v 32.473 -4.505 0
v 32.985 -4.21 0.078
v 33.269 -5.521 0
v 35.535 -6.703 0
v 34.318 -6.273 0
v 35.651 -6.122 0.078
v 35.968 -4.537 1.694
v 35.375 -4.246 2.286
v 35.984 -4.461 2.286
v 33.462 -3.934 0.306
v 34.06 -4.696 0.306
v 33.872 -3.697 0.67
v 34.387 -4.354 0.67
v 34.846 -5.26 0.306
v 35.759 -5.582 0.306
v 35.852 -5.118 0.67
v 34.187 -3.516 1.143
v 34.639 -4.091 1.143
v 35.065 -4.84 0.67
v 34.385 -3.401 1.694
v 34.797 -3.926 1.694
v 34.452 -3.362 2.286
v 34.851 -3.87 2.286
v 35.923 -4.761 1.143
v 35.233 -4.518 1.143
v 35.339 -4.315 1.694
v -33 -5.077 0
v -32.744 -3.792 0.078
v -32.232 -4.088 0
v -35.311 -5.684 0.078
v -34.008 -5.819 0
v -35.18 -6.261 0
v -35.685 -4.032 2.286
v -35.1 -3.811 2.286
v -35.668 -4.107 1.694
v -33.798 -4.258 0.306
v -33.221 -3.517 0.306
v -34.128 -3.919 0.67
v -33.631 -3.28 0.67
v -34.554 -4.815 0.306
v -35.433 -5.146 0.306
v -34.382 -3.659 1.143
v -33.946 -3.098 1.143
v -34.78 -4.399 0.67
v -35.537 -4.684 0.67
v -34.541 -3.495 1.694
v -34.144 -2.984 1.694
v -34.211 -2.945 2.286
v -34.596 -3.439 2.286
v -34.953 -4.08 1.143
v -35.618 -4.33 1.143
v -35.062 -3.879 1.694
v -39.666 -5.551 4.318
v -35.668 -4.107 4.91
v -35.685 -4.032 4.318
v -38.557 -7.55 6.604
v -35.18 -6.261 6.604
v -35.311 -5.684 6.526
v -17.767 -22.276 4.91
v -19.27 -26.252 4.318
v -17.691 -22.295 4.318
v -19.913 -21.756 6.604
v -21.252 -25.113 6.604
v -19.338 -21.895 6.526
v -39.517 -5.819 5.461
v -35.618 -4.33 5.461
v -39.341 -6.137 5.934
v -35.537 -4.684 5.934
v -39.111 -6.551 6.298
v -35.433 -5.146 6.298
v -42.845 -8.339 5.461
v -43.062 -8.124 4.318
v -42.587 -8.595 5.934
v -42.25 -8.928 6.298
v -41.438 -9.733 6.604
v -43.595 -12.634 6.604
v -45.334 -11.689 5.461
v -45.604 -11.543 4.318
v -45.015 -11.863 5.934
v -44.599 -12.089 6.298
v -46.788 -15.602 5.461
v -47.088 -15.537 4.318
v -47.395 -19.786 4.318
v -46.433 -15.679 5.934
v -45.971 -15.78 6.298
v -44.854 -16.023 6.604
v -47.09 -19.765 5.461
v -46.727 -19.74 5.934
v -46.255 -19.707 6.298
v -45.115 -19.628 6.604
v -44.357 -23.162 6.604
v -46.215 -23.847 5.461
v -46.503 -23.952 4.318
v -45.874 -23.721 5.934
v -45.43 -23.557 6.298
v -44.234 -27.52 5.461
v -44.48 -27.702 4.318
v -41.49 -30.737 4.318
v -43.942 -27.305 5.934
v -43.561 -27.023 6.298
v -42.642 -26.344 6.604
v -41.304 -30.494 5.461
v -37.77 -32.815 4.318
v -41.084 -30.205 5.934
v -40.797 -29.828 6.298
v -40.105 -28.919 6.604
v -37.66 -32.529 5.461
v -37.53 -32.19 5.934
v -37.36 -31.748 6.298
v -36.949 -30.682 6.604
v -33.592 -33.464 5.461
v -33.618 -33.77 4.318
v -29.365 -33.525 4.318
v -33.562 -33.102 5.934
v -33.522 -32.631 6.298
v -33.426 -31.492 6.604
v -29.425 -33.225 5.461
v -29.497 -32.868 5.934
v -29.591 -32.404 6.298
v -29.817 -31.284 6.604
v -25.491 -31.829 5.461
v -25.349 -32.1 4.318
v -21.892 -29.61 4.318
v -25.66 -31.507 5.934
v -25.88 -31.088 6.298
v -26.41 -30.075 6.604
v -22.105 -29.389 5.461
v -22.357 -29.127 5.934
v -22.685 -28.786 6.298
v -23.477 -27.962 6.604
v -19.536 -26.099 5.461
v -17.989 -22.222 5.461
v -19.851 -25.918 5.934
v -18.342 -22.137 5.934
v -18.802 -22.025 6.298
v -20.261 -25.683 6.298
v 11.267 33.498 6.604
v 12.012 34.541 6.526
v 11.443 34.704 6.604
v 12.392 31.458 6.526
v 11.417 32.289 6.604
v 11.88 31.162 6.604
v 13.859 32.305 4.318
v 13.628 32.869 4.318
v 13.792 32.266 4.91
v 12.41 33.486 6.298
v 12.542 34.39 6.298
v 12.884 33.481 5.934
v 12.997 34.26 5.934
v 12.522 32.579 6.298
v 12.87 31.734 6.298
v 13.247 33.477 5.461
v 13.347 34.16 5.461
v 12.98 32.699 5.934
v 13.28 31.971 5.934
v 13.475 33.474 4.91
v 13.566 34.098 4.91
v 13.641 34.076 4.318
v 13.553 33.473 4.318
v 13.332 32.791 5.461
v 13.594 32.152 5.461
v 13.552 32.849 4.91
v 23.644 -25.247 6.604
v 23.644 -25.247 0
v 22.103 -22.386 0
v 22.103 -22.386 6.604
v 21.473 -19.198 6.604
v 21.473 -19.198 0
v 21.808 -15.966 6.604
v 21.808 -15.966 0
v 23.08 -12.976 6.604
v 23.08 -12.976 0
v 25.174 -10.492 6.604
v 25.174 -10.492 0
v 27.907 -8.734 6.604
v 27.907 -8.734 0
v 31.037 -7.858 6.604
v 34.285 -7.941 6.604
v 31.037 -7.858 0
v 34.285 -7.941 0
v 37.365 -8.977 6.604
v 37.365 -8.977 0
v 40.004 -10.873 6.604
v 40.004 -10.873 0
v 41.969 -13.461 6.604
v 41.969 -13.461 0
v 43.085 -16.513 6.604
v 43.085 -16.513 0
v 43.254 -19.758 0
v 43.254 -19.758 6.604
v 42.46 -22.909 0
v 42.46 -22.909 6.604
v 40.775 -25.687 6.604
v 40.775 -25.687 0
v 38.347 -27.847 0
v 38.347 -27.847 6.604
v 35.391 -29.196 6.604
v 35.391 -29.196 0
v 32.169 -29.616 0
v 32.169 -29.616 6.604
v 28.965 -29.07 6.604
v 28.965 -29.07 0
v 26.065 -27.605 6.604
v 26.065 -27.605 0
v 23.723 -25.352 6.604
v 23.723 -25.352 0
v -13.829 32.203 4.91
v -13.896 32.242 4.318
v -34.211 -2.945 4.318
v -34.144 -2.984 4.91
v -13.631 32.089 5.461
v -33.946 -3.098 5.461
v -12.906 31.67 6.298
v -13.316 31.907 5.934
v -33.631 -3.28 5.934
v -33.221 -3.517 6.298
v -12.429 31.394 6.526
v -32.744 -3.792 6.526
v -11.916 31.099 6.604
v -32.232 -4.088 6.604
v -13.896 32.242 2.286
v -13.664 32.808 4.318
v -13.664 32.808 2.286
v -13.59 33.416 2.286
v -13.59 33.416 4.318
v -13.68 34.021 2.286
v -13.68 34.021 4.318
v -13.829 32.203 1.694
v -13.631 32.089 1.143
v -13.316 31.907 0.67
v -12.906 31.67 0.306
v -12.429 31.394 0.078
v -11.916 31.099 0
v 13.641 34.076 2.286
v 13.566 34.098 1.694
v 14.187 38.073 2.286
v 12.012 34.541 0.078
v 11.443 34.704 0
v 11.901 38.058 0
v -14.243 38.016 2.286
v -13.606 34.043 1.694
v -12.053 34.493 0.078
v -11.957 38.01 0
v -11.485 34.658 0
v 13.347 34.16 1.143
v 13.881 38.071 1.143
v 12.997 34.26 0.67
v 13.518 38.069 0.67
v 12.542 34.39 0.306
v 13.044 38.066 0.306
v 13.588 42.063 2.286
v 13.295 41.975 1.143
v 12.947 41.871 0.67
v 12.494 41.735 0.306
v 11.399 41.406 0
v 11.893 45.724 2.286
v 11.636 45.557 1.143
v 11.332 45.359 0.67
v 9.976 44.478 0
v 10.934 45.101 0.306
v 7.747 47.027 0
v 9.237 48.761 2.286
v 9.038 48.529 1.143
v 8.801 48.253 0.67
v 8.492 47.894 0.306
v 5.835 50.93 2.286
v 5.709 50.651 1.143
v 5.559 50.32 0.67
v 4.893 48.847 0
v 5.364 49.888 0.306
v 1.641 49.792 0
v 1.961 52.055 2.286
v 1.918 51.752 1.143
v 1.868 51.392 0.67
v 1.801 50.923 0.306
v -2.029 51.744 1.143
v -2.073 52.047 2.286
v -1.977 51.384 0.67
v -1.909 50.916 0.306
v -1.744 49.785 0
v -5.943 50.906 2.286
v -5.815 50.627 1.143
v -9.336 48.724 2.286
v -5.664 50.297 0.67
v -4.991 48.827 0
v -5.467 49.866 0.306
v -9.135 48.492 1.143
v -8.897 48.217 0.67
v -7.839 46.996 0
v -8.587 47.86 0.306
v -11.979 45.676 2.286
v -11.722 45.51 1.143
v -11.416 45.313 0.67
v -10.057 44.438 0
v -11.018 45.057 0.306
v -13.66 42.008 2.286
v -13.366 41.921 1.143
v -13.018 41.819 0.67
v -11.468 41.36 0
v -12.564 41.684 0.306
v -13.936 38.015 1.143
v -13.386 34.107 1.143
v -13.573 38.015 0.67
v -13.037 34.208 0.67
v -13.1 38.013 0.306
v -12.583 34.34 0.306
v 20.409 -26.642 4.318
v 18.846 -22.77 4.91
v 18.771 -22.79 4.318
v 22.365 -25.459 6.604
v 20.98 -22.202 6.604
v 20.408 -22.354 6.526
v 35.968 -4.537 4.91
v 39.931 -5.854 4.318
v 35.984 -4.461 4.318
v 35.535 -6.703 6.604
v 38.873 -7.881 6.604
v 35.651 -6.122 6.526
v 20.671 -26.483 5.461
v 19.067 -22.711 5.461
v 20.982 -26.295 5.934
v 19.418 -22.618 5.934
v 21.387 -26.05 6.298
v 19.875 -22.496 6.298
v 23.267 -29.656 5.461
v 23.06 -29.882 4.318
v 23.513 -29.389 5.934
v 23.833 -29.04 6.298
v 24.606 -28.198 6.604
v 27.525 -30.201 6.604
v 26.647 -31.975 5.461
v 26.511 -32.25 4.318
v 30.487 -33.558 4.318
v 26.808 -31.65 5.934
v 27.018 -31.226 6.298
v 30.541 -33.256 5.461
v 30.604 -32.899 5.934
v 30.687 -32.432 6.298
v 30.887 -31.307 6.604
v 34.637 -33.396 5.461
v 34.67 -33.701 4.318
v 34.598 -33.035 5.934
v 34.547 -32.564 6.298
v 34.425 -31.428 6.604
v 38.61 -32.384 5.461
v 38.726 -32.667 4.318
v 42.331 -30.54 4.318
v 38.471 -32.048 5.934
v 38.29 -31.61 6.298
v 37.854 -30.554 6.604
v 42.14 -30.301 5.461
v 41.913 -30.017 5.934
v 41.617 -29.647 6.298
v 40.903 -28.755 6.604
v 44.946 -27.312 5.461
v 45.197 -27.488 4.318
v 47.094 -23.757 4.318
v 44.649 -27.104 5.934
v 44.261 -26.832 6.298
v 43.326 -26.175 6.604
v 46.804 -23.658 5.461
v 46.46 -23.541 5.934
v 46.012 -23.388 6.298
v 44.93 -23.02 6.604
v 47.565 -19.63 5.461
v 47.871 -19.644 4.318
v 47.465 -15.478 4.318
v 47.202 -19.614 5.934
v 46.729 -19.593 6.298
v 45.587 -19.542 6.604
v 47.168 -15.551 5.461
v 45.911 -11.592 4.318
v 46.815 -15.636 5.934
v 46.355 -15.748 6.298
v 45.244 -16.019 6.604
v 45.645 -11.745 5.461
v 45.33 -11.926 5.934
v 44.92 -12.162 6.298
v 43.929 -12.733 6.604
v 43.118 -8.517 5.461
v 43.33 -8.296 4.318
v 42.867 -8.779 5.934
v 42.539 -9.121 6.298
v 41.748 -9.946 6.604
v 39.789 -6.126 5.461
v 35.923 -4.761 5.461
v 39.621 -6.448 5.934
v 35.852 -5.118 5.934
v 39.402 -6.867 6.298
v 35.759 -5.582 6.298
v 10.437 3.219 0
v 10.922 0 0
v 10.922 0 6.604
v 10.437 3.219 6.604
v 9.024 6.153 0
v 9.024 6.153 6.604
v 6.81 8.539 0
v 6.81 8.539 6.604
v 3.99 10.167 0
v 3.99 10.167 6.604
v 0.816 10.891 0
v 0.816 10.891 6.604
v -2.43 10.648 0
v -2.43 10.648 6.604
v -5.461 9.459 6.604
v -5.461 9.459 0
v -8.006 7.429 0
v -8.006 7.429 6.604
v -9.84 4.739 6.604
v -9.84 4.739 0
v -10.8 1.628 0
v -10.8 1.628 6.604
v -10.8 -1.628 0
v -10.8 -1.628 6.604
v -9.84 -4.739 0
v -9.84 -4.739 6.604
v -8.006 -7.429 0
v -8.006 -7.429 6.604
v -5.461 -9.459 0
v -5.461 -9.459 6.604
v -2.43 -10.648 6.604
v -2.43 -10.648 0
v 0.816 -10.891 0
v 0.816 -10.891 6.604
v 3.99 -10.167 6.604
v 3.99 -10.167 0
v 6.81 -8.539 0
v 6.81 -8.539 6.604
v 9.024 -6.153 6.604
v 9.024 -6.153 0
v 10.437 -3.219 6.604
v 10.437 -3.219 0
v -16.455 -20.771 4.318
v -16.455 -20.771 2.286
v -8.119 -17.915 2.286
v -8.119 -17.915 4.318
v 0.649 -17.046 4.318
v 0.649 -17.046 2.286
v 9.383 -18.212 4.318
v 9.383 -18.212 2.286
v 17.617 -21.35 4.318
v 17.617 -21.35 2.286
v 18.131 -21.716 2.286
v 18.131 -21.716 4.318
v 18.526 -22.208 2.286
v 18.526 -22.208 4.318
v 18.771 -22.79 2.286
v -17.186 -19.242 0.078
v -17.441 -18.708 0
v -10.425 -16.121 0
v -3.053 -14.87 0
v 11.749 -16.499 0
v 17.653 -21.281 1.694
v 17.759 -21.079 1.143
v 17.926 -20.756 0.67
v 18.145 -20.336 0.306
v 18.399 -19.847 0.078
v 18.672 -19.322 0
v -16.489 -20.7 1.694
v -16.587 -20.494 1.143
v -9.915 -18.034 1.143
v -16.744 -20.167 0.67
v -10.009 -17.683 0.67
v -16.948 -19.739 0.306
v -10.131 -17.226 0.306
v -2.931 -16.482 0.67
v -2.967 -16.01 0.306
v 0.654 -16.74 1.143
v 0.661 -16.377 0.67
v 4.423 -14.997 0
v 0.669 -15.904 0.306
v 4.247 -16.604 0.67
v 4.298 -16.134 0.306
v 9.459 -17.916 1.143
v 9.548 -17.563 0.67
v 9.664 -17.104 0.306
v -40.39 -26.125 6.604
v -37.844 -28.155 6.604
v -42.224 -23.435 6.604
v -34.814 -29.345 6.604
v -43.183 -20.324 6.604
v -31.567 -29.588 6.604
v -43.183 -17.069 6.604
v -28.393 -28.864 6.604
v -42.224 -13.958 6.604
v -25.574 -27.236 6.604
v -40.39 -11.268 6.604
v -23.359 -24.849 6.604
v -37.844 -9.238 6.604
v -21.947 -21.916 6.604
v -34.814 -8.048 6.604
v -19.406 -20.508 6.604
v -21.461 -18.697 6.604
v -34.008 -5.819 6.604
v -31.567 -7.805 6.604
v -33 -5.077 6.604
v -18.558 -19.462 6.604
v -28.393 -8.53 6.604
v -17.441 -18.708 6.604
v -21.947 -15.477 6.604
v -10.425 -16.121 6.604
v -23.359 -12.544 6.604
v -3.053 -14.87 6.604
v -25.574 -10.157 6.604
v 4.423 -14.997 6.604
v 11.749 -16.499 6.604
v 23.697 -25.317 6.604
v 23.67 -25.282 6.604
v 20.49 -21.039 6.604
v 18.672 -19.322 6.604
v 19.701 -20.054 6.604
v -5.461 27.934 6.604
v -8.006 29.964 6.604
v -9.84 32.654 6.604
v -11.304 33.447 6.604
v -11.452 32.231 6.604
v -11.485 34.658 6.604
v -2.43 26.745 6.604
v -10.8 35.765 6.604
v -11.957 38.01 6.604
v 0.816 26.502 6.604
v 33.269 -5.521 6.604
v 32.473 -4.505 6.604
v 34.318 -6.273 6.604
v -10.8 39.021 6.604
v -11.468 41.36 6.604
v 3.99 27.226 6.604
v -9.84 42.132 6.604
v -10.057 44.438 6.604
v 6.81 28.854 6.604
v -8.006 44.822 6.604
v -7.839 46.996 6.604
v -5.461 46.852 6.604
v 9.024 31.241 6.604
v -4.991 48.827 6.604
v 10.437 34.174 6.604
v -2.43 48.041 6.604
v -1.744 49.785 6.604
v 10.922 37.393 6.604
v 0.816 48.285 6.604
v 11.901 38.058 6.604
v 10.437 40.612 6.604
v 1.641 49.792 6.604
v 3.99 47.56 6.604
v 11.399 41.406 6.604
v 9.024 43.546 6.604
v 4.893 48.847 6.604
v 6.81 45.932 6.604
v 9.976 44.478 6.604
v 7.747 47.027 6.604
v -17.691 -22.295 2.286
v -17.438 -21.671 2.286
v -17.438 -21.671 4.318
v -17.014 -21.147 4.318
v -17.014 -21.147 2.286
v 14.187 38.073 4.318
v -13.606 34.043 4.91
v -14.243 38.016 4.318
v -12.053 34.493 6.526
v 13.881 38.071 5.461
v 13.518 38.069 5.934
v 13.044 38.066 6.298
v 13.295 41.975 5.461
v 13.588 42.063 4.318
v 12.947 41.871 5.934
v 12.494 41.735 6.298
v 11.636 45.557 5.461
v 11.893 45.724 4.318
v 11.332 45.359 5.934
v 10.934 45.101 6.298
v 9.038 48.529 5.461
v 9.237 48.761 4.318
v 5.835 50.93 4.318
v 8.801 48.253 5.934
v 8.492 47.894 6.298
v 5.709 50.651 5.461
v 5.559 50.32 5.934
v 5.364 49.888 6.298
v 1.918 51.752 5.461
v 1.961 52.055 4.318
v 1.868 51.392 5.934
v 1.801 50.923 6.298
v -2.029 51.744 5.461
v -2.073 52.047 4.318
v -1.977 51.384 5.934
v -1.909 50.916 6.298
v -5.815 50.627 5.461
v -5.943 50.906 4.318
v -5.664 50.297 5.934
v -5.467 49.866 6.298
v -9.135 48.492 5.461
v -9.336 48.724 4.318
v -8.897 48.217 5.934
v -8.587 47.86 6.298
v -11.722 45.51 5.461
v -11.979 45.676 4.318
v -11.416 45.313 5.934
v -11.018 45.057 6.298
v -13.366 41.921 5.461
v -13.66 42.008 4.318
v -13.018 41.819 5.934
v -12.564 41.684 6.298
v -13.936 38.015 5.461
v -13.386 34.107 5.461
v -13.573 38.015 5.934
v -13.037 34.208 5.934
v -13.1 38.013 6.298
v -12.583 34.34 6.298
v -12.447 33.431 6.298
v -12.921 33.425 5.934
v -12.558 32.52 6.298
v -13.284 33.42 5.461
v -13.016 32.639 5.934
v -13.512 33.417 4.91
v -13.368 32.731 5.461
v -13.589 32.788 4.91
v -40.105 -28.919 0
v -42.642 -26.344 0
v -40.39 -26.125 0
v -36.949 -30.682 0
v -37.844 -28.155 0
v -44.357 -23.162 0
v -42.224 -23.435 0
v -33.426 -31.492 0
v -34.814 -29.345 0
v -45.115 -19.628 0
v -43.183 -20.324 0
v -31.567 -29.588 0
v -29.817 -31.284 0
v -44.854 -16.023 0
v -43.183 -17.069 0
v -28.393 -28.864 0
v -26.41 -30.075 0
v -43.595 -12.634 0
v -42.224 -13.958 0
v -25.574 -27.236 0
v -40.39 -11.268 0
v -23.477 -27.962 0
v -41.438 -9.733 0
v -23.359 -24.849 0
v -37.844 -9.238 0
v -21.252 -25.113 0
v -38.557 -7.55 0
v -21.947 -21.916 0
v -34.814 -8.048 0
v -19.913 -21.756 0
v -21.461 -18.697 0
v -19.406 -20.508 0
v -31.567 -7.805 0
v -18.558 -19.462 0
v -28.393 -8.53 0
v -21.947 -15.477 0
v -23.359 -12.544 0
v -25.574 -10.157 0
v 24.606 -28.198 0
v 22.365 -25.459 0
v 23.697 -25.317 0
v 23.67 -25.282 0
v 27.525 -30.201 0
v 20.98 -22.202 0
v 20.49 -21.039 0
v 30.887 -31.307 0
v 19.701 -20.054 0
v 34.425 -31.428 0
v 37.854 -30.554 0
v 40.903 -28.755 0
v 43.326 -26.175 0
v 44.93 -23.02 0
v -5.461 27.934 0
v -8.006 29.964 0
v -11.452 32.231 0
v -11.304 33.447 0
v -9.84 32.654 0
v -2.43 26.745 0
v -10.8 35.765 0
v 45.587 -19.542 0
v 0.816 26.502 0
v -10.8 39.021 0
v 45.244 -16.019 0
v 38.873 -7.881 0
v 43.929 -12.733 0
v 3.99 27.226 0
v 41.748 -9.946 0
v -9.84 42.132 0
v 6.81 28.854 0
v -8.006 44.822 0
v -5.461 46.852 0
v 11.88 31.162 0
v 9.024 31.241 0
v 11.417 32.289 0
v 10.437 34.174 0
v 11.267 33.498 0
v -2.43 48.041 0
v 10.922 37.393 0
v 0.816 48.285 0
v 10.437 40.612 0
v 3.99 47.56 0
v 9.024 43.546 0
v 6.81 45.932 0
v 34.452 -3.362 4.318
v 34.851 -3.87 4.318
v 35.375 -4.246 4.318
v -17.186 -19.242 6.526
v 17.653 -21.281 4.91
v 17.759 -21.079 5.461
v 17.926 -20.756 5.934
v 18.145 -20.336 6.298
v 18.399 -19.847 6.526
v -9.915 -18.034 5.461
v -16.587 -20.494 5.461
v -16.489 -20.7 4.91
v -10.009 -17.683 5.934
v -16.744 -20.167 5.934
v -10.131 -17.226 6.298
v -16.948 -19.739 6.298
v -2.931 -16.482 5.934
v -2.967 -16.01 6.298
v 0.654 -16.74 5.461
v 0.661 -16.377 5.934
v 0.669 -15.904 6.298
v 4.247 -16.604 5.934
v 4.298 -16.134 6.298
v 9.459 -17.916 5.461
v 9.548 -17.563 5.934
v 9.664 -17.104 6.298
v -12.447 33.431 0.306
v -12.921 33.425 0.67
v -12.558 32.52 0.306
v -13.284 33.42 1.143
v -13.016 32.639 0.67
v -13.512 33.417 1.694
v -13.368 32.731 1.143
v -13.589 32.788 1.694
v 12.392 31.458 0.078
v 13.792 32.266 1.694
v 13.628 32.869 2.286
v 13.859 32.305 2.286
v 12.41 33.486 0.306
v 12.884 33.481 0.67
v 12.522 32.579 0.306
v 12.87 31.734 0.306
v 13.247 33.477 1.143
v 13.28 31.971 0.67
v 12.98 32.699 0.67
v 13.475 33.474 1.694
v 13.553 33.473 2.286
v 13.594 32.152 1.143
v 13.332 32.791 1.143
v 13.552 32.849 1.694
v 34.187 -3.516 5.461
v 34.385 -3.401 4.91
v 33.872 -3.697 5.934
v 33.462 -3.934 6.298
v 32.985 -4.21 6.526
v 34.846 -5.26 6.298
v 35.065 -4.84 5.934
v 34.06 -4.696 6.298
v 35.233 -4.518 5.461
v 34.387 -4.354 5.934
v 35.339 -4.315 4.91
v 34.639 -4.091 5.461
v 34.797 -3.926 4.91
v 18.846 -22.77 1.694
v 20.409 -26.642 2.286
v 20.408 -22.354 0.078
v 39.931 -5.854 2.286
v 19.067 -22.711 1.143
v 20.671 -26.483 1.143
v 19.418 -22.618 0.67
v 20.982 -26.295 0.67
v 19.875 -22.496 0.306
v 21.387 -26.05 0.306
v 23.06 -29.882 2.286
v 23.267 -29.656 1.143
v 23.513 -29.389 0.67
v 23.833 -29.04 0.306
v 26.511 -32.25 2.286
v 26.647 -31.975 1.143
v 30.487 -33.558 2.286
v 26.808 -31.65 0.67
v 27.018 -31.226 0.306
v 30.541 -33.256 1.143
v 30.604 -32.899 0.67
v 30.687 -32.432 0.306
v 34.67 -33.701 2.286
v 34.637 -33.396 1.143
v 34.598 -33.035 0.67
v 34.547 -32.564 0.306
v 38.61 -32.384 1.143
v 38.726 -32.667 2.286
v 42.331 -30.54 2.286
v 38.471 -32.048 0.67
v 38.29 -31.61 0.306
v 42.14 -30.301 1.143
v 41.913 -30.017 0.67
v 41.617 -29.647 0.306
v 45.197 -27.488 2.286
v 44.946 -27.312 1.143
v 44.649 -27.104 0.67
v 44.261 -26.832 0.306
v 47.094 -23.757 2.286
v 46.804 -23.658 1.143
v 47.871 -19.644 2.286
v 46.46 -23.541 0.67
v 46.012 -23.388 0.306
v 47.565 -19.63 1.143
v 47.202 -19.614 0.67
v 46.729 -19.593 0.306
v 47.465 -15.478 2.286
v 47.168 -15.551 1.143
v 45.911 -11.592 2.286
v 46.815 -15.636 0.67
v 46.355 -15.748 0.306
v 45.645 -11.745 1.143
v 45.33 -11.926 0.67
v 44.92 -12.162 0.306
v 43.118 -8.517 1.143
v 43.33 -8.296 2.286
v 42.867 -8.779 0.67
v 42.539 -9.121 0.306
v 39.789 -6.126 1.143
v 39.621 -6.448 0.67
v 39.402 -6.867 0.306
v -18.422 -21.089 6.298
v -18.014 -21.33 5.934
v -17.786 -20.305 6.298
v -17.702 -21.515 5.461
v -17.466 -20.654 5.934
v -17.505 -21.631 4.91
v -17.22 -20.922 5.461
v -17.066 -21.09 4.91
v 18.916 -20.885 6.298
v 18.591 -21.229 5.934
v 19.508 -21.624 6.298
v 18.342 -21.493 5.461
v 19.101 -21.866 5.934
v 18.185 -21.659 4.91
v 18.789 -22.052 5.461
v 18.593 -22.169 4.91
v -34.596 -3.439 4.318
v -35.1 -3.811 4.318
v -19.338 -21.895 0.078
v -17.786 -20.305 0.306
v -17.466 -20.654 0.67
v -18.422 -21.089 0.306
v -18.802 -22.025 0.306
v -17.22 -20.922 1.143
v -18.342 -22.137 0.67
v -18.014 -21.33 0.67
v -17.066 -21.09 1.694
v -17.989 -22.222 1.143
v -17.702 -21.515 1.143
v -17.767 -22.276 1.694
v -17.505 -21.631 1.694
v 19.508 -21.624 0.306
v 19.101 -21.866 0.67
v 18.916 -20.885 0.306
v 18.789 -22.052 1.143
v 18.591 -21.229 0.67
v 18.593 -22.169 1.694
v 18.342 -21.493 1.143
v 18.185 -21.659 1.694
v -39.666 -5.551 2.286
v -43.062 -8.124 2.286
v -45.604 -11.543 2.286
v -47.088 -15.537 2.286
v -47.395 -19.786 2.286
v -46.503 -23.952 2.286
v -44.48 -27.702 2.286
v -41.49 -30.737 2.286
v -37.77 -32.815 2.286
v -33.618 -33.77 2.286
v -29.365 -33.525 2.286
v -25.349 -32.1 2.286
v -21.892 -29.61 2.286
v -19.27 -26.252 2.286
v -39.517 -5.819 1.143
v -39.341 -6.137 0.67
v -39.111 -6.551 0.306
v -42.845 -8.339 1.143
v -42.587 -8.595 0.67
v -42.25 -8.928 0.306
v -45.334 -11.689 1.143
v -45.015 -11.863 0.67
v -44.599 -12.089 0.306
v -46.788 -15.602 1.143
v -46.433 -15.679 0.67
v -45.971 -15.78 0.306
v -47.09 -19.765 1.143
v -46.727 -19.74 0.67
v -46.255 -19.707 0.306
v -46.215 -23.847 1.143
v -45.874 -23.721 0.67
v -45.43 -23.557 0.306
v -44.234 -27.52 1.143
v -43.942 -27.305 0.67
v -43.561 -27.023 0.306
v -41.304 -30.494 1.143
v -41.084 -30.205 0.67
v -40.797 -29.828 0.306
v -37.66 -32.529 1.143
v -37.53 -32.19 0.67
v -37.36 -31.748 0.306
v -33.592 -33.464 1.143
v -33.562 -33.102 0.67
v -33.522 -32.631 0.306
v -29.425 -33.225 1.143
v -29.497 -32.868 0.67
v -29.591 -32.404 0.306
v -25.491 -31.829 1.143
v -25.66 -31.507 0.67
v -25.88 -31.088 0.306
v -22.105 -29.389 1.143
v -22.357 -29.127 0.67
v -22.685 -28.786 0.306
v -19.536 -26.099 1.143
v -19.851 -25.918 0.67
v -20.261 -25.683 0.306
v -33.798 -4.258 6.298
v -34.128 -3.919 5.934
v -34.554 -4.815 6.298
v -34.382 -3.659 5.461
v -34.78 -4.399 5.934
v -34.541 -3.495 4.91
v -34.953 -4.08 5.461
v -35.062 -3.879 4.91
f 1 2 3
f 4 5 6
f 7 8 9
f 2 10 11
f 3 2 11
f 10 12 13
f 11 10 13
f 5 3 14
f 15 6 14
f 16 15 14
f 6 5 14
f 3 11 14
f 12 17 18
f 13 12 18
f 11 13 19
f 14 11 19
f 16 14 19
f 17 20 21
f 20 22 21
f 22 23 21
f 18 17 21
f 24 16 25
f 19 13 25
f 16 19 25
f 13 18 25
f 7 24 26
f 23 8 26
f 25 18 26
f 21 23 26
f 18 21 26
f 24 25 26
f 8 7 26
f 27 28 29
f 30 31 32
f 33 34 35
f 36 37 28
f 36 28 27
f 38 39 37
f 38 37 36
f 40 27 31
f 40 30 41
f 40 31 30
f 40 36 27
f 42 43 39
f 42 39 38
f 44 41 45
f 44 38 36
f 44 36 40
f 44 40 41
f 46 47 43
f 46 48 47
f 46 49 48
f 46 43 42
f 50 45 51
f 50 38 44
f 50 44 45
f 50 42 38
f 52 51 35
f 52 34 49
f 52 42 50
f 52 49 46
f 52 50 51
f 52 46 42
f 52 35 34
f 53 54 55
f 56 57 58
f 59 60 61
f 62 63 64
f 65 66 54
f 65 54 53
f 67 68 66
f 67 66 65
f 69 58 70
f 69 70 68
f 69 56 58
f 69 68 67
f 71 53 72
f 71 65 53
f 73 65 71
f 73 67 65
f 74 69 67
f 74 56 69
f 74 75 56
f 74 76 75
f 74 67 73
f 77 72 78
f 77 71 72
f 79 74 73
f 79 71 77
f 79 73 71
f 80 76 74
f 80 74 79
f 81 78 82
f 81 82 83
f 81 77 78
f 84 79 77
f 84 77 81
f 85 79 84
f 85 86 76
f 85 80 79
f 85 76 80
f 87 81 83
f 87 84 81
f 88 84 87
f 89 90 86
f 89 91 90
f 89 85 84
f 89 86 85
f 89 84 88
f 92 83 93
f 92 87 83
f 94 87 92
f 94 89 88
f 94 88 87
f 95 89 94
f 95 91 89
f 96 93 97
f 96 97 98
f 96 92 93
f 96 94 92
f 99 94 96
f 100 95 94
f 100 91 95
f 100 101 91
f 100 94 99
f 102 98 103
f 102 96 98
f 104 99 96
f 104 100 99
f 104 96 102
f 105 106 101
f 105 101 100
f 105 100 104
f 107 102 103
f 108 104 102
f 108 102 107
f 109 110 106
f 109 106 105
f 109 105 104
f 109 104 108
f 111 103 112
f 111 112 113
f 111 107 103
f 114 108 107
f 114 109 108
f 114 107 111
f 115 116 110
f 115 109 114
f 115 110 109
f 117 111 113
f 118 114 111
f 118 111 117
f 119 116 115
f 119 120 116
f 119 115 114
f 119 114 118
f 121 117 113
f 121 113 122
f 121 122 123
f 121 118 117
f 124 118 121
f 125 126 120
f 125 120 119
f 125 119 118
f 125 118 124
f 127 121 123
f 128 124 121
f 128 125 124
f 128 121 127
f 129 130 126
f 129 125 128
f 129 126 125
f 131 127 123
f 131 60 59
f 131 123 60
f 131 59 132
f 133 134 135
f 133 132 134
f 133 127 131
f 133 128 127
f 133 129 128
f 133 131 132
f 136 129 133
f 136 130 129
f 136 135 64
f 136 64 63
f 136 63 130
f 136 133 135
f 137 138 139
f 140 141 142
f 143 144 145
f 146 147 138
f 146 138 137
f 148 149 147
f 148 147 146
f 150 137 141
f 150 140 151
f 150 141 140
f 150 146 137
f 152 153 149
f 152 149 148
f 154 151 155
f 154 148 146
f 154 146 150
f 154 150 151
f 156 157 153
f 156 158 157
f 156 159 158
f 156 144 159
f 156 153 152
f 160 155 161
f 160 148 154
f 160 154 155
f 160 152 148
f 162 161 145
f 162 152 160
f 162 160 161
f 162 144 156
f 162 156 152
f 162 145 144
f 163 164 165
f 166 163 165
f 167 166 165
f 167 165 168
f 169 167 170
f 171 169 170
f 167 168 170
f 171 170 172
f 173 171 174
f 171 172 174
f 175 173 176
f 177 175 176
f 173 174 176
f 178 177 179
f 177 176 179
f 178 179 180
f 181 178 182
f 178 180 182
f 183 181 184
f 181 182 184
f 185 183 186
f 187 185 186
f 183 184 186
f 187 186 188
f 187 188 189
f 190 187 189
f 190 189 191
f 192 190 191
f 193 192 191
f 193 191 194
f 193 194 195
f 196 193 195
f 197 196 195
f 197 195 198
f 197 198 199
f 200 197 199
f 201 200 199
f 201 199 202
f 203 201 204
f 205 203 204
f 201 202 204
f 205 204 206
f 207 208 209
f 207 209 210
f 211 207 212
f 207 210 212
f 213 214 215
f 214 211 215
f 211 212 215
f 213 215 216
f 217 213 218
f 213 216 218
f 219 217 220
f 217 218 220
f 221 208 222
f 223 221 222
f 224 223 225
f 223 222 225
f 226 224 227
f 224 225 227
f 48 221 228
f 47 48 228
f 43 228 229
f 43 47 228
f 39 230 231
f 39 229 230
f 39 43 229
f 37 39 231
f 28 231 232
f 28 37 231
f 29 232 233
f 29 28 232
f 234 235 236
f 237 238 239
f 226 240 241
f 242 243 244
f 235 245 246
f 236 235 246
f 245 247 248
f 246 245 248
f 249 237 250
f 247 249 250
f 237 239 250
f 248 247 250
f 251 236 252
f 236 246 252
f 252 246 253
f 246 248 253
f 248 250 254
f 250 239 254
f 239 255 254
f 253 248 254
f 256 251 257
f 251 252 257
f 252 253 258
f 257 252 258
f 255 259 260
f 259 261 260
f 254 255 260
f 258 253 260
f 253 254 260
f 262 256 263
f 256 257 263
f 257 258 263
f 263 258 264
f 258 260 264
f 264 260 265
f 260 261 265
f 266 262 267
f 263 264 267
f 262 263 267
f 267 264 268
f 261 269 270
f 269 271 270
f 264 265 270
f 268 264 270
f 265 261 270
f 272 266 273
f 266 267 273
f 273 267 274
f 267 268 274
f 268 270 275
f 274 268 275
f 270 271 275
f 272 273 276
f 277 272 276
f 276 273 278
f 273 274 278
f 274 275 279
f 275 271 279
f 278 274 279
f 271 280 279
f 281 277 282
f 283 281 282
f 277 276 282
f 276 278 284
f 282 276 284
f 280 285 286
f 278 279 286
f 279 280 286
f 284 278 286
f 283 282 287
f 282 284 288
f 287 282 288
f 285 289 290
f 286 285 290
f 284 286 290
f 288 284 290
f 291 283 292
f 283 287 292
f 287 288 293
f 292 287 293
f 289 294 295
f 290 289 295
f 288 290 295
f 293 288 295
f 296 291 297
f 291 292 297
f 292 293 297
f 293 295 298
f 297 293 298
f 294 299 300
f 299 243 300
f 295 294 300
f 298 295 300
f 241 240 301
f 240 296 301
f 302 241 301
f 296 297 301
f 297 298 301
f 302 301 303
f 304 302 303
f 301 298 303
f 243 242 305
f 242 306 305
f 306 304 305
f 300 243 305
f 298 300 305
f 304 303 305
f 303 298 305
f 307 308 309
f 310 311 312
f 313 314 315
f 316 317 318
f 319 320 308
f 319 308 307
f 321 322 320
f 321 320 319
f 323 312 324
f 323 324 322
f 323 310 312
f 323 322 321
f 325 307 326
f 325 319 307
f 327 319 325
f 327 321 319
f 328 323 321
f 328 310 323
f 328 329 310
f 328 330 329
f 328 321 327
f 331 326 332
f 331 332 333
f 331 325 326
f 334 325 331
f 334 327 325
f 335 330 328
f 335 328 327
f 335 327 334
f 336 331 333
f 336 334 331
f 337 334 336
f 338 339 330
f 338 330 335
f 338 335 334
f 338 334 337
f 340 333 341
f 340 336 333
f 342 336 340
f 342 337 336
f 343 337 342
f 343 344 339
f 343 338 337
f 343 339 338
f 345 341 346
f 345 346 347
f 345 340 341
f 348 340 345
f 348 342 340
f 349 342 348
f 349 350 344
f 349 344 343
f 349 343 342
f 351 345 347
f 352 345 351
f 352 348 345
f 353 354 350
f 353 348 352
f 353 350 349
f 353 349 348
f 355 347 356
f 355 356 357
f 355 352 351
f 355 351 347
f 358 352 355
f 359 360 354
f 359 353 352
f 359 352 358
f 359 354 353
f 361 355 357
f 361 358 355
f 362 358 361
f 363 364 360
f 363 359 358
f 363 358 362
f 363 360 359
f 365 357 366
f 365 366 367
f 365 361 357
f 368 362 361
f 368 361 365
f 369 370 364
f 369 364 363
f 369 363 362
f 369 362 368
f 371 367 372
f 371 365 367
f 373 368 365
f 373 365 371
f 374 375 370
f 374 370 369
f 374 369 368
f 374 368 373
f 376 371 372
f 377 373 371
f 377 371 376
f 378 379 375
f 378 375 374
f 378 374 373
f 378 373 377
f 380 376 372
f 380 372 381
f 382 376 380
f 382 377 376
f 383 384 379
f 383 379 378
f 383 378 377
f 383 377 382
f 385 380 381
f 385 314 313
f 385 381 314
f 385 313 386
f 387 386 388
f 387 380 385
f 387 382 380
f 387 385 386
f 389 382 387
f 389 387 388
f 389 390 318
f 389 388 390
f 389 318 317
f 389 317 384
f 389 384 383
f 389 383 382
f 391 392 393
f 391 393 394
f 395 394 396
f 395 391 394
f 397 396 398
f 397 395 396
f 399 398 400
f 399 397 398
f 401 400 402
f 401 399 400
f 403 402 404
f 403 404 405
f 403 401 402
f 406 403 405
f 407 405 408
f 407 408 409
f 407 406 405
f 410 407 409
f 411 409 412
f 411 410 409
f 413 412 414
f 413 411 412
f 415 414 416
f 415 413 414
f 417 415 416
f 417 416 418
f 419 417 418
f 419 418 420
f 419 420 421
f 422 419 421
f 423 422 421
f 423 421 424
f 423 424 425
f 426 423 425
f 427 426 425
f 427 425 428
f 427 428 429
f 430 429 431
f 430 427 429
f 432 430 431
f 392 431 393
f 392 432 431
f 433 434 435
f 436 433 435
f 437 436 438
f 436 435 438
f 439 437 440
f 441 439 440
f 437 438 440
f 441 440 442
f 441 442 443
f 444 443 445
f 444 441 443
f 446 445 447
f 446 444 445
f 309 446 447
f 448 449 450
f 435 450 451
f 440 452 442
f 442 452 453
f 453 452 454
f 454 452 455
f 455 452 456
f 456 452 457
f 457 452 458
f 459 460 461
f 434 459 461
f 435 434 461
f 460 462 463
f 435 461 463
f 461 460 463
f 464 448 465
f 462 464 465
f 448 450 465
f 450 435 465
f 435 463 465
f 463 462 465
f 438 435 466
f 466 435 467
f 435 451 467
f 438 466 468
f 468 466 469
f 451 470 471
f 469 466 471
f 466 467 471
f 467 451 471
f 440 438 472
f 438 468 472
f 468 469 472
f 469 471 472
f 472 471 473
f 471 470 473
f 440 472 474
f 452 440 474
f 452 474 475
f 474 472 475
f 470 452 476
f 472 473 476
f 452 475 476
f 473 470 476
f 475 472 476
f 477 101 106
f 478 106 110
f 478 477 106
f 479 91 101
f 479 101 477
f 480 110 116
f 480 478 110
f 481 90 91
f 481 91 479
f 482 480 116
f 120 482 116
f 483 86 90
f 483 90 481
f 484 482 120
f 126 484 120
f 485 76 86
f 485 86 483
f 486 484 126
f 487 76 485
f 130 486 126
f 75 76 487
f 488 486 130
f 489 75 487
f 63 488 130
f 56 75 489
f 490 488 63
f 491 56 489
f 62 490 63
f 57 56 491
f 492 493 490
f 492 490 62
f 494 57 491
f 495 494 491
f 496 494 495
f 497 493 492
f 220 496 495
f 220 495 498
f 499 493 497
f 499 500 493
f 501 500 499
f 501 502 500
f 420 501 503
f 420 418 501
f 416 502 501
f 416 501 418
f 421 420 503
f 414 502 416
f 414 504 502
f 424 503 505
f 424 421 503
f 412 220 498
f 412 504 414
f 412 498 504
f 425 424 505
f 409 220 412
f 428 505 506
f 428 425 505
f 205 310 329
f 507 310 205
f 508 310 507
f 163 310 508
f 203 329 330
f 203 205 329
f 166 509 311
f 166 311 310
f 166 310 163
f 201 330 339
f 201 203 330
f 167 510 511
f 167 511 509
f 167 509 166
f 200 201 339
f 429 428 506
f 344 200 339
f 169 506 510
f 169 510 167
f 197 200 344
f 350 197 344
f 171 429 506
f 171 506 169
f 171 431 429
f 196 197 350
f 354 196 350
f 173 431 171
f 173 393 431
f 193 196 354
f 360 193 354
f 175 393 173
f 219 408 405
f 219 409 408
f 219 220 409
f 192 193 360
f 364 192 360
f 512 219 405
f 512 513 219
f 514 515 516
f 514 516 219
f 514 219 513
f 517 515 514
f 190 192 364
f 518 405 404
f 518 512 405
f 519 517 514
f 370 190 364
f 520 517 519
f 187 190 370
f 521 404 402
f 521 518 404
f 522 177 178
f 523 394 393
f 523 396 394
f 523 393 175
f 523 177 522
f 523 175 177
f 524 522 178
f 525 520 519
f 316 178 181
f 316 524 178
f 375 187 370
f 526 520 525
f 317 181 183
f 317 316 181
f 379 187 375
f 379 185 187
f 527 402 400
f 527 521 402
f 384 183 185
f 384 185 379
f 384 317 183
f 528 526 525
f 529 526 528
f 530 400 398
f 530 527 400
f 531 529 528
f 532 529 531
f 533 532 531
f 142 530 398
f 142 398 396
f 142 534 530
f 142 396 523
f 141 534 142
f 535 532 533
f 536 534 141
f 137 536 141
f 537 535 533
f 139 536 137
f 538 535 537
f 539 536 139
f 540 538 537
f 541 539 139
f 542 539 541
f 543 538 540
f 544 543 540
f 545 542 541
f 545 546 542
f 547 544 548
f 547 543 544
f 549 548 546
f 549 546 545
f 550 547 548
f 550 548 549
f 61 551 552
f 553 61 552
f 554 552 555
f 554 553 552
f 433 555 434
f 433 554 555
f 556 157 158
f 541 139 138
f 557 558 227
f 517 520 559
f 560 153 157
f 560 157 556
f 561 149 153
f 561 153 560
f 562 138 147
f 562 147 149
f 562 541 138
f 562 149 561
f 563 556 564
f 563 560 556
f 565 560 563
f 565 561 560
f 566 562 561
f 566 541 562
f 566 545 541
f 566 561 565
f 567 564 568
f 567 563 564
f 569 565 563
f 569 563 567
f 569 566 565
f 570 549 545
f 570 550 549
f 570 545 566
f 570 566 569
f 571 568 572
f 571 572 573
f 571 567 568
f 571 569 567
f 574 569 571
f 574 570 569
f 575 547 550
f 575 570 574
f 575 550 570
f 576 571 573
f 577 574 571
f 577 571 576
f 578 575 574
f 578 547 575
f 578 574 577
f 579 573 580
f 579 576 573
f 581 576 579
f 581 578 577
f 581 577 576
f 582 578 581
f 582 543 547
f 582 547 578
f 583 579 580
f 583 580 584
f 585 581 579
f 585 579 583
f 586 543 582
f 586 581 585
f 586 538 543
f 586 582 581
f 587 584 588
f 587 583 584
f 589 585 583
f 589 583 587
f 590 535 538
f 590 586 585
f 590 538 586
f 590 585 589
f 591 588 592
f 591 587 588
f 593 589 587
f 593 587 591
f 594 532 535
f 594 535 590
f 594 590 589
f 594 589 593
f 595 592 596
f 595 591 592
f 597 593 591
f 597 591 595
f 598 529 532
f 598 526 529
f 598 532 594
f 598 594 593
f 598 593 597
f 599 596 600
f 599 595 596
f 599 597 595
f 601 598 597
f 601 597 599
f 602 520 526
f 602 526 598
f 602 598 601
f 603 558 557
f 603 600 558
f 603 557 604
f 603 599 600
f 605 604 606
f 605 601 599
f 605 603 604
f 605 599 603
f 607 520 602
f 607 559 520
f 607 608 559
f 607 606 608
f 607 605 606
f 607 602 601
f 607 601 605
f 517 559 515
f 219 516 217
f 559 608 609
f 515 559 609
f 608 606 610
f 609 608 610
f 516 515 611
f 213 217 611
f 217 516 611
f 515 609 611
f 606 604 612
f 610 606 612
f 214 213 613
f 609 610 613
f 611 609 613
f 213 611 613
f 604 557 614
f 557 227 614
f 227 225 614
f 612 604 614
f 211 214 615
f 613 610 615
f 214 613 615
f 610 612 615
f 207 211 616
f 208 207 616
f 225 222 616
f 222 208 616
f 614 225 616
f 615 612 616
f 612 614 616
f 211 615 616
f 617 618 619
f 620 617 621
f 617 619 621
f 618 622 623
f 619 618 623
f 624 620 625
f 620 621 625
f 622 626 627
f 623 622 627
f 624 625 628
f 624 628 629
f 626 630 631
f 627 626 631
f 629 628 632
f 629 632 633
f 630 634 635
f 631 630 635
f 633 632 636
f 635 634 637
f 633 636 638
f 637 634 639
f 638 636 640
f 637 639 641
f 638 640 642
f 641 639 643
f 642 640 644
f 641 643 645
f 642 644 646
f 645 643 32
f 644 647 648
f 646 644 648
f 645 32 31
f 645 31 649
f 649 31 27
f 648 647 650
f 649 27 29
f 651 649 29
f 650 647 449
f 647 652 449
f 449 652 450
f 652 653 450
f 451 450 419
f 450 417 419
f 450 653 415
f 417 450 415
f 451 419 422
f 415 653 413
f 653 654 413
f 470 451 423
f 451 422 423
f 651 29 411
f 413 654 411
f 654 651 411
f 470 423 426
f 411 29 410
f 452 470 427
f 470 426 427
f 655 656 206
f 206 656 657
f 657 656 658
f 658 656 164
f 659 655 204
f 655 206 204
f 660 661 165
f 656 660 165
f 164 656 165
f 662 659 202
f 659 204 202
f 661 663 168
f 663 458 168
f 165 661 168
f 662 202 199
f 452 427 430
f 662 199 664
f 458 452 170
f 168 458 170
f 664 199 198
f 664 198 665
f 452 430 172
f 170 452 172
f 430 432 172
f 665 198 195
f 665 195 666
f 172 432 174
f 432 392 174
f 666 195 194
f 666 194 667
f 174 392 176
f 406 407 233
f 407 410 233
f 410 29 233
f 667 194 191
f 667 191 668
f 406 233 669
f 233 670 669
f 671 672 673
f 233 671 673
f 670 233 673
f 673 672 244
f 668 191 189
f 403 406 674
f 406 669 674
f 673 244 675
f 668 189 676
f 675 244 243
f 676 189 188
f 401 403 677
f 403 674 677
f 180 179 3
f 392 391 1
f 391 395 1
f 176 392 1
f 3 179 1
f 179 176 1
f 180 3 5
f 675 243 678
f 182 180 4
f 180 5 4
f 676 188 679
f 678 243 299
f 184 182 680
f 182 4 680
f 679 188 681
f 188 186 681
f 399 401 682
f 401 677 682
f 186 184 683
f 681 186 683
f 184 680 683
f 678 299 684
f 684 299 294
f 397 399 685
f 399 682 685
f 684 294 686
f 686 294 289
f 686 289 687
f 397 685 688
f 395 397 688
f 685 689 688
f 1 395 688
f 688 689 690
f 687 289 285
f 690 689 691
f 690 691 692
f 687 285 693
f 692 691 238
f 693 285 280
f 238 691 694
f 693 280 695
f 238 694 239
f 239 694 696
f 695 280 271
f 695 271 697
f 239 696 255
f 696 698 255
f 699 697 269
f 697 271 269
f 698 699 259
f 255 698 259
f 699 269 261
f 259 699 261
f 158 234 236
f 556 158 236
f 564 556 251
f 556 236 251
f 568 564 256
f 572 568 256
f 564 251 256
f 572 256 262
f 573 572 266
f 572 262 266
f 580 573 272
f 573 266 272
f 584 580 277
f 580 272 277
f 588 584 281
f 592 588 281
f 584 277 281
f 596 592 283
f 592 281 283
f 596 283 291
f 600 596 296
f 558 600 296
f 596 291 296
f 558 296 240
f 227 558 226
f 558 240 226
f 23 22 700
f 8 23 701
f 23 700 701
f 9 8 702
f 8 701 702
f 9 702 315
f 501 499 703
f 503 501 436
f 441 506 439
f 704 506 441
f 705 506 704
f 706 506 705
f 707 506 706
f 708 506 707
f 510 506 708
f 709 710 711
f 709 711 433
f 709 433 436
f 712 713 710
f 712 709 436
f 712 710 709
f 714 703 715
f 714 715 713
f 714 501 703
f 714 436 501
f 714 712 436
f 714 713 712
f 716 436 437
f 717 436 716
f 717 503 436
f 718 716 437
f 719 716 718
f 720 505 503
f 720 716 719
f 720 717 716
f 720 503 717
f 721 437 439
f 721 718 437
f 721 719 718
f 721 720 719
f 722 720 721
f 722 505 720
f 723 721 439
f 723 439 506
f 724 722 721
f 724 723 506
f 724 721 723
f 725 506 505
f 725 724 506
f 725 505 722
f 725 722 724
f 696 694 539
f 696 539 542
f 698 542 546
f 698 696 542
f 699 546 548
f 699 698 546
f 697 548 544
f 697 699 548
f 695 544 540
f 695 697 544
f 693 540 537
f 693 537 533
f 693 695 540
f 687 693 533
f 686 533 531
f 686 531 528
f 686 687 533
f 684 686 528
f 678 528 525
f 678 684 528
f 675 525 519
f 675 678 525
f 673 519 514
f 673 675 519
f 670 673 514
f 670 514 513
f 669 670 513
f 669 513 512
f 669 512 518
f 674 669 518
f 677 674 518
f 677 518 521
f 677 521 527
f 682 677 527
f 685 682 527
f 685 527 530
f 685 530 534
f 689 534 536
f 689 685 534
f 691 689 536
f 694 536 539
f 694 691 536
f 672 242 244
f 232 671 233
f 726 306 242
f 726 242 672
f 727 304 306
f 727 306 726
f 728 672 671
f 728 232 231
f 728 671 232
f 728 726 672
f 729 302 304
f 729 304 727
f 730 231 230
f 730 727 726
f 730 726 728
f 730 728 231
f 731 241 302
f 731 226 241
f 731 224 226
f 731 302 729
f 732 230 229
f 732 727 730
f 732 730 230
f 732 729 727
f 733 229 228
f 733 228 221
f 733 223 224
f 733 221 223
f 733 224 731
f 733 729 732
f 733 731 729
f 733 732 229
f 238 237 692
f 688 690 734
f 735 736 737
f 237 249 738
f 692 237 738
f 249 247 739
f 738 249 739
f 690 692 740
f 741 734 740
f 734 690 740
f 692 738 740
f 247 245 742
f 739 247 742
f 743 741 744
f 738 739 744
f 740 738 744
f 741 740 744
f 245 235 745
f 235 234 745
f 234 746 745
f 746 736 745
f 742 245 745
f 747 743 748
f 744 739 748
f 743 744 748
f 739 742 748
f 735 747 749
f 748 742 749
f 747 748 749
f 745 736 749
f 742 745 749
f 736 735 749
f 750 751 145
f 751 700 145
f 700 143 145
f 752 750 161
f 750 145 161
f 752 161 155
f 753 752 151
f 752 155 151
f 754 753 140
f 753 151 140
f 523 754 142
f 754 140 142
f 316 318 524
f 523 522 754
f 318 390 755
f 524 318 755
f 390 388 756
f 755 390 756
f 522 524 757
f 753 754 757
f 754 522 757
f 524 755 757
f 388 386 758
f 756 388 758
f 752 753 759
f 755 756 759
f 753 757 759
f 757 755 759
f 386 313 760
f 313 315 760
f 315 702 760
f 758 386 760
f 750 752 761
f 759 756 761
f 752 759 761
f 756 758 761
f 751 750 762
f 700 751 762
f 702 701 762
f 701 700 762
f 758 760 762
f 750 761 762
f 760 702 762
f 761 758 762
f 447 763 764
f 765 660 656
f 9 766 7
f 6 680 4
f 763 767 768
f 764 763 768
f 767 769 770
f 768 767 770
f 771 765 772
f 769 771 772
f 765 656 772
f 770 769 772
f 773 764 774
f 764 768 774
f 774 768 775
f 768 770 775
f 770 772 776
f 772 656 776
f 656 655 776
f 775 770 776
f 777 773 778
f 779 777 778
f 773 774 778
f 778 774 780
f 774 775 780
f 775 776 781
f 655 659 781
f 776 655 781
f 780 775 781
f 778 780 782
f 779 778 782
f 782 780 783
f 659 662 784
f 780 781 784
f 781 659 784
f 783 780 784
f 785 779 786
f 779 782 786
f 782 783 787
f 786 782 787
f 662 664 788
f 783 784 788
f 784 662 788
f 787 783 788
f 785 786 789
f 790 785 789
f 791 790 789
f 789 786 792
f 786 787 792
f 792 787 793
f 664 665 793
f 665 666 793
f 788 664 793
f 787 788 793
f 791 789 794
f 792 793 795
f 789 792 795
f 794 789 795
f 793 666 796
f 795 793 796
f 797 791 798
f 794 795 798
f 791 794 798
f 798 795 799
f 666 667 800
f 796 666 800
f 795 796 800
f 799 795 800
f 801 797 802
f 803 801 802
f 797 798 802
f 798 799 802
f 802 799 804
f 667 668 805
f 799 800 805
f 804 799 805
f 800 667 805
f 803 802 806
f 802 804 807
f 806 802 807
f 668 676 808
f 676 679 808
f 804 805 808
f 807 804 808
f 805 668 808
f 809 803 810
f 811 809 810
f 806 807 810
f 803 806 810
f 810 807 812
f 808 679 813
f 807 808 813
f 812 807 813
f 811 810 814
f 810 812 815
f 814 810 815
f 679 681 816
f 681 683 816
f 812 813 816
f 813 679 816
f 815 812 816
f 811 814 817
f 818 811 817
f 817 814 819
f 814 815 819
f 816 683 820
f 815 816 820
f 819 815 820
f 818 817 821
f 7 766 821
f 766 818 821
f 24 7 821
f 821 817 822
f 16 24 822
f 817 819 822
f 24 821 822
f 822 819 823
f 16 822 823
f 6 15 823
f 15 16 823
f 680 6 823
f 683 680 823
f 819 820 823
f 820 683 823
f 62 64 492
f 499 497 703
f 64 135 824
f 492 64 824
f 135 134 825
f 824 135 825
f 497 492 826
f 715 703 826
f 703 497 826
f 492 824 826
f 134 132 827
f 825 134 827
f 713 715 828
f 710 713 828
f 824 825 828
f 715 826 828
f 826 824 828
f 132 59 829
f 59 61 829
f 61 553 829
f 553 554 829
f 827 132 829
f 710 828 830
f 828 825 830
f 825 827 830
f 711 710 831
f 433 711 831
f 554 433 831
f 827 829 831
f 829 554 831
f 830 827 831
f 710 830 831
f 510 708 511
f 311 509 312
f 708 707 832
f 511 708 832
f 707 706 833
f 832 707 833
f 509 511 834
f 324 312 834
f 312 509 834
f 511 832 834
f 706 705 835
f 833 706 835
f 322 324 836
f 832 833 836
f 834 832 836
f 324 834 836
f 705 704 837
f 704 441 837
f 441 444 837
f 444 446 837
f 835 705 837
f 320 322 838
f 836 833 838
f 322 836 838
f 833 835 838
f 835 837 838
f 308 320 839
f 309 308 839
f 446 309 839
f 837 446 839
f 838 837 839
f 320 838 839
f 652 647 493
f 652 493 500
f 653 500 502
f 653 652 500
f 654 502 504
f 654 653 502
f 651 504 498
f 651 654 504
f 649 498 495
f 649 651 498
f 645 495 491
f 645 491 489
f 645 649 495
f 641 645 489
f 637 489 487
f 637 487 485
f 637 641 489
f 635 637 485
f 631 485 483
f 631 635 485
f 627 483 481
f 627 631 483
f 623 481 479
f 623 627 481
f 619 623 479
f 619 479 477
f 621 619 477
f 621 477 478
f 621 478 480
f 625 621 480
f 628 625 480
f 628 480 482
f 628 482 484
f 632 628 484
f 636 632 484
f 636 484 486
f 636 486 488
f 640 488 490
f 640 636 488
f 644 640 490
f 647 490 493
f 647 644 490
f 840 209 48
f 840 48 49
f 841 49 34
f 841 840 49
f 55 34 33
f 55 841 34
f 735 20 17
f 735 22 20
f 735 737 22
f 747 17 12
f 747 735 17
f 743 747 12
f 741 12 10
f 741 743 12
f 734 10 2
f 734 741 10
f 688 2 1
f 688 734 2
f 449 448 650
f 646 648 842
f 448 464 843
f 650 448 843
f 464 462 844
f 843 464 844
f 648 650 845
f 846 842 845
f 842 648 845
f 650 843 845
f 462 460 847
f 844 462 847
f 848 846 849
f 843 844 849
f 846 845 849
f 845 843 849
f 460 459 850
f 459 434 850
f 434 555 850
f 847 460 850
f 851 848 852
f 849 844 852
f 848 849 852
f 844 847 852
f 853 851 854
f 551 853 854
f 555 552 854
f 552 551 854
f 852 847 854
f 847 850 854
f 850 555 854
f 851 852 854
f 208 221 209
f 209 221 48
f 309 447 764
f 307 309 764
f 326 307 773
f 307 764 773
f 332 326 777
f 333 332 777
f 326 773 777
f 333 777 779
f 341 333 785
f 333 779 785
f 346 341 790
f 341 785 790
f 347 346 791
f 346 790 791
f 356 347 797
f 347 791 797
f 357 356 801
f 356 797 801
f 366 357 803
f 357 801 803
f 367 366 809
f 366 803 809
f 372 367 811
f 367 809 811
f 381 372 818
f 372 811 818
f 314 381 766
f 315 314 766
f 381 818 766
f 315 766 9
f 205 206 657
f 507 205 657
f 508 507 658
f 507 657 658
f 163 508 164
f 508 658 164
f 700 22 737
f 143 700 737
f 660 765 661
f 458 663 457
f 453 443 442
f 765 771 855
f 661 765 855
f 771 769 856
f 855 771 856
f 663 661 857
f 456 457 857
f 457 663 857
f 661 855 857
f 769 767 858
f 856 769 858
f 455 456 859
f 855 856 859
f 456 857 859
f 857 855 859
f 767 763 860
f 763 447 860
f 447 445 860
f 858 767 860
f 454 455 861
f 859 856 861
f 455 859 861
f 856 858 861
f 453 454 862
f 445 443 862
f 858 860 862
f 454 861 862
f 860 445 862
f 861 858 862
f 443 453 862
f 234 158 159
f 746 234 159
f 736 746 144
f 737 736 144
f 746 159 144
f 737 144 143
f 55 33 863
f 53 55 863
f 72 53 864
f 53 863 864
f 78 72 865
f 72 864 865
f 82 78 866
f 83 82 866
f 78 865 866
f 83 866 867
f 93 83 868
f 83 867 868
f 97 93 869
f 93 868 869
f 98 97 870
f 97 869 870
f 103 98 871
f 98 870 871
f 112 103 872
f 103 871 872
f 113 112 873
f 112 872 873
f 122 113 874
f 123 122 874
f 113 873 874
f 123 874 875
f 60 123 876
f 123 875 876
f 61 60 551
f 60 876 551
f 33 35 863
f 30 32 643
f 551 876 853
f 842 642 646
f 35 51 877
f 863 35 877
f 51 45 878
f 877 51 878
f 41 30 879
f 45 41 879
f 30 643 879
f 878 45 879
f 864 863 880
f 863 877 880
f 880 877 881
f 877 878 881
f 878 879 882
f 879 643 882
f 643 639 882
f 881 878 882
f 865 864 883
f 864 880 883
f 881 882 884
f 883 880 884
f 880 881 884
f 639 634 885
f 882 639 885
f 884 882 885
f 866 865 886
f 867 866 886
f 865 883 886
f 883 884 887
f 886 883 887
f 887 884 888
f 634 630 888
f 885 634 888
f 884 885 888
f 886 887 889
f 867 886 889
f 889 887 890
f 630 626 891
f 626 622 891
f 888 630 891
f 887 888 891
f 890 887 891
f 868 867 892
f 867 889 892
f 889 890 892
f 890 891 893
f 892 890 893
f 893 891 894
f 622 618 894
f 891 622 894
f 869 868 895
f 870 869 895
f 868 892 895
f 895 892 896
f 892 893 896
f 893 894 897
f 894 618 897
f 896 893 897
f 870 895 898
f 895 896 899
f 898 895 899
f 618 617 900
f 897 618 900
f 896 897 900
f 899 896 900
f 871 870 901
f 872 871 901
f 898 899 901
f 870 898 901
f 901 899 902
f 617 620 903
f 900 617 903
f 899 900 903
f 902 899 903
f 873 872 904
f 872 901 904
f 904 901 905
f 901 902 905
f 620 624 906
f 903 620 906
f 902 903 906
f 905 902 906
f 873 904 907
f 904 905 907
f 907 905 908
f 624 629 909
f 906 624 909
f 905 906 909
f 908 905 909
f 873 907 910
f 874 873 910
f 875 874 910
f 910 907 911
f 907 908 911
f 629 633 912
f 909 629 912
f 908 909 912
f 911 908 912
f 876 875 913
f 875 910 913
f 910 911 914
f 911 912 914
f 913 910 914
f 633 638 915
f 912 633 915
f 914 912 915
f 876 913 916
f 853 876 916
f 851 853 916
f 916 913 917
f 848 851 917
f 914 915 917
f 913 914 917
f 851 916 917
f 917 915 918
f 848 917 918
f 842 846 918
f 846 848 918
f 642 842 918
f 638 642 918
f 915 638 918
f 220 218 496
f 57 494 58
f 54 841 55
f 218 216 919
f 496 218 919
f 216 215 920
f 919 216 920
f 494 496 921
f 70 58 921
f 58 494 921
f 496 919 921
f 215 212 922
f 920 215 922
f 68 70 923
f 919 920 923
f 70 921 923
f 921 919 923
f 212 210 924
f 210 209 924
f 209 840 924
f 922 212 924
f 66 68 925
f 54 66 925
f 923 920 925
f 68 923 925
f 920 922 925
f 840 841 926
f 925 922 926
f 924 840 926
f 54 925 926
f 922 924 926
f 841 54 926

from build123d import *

# Parameters (mm, degrees)
F0_R     = 10.922
F1_DEPTH = 6.604
F2_R     = 2.286


with BuildPart() as f1:
    # F0 (on Top) → F1 (new body)
    with BuildSketch(Plane.XY):
        with BuildLine():
            Line((-13.3873032043, 33.1231516497), (-34.7322359773, -3.8473563972))
            ThreePointArc((-34.7322359773, -3.8473563972), (-43.0701011693, -29.3490933873), (-17.4819467583, -21.2803302039))
            ThreePointArc((-17.4819467583, -21.2803302039), (0.6081285176, -17.0457166579), (18.5540814858, -21.8546195923))
            ThreePointArc((18.5540814858, -21.8546195923), (43.8875031627, -29.0995032663), (34.9920927448, -4.2974415213))
            Line((34.9920927448, -4.2974415213), (13.3533630424, 33.1819377345))
            ThreePointArc((13.3533630424, 33.1819377345), (-0.0588324041, 52.1949153144), (-13.3873032043, 33.1231516497))
        make_face()
        with Locations((-32.3834455885, -18.6965910278)):
            Circle(F0_R, mode=Mode.SUBTRACT)
        Circle(F0_R, mode=Mode.SUBTRACT)
        with BuildLine():
            ThreePointArc((23.643944132, -25.247254986), (28.9311094886, -8.3345709808), (43.3054455885, -18.6965910278))
            ThreePointArc((43.3054455885, -18.6965910278), (35.8980520612, -29.0376560282), (23.7233863792, -25.3519241143))
            ThreePointArc((23.7233863792, -25.3519241143), (23.6835078446, -25.2997090226), (23.643944132, -25.247254986))
        make_face(mode=Mode.SUBTRACT)
        with Locations((0, 37.3931820556)):
            Circle(F0_R, mode=Mode.SUBTRACT)
    extrude(amount=F1_DEPTH)

    # F2
    f2_edges = [f1.edges().sort_by_distance(p)[0] for p in [
        (-17.481947, -21.28033, 3.302),
        (18.554081, -21.85462, 3.302),
        (34.992093, -4.297442, 3.302),
        (-13.387303, 33.123152, 3.302),
        (-34.732236, -3.847356, 3.302),
        (13.353363, 33.181938, 3.302),
        (-0.058832, 52.194915, 0),
        (-0.058832, 52.194915, 6.604),
        (-24.05977, 14.637898, 0),
        (-24.05977, 14.637898, 6.604),
        (-43.070101, -29.349093, 6.604),
        (0.608129, -17.045717, 6.604),
        (43.887503, -29.099503, 6.604),
        (24.172728, 14.442248, 6.604),
        (24.172728, 14.442248, 0),
        (43.887503, -29.099503, 0),
        (0.608129, -17.045717, 0),
        (-43.070101, -29.349093, 0),
    ]]
    fillet(f2_edges, radius=F2_R)


solid = f1.part
